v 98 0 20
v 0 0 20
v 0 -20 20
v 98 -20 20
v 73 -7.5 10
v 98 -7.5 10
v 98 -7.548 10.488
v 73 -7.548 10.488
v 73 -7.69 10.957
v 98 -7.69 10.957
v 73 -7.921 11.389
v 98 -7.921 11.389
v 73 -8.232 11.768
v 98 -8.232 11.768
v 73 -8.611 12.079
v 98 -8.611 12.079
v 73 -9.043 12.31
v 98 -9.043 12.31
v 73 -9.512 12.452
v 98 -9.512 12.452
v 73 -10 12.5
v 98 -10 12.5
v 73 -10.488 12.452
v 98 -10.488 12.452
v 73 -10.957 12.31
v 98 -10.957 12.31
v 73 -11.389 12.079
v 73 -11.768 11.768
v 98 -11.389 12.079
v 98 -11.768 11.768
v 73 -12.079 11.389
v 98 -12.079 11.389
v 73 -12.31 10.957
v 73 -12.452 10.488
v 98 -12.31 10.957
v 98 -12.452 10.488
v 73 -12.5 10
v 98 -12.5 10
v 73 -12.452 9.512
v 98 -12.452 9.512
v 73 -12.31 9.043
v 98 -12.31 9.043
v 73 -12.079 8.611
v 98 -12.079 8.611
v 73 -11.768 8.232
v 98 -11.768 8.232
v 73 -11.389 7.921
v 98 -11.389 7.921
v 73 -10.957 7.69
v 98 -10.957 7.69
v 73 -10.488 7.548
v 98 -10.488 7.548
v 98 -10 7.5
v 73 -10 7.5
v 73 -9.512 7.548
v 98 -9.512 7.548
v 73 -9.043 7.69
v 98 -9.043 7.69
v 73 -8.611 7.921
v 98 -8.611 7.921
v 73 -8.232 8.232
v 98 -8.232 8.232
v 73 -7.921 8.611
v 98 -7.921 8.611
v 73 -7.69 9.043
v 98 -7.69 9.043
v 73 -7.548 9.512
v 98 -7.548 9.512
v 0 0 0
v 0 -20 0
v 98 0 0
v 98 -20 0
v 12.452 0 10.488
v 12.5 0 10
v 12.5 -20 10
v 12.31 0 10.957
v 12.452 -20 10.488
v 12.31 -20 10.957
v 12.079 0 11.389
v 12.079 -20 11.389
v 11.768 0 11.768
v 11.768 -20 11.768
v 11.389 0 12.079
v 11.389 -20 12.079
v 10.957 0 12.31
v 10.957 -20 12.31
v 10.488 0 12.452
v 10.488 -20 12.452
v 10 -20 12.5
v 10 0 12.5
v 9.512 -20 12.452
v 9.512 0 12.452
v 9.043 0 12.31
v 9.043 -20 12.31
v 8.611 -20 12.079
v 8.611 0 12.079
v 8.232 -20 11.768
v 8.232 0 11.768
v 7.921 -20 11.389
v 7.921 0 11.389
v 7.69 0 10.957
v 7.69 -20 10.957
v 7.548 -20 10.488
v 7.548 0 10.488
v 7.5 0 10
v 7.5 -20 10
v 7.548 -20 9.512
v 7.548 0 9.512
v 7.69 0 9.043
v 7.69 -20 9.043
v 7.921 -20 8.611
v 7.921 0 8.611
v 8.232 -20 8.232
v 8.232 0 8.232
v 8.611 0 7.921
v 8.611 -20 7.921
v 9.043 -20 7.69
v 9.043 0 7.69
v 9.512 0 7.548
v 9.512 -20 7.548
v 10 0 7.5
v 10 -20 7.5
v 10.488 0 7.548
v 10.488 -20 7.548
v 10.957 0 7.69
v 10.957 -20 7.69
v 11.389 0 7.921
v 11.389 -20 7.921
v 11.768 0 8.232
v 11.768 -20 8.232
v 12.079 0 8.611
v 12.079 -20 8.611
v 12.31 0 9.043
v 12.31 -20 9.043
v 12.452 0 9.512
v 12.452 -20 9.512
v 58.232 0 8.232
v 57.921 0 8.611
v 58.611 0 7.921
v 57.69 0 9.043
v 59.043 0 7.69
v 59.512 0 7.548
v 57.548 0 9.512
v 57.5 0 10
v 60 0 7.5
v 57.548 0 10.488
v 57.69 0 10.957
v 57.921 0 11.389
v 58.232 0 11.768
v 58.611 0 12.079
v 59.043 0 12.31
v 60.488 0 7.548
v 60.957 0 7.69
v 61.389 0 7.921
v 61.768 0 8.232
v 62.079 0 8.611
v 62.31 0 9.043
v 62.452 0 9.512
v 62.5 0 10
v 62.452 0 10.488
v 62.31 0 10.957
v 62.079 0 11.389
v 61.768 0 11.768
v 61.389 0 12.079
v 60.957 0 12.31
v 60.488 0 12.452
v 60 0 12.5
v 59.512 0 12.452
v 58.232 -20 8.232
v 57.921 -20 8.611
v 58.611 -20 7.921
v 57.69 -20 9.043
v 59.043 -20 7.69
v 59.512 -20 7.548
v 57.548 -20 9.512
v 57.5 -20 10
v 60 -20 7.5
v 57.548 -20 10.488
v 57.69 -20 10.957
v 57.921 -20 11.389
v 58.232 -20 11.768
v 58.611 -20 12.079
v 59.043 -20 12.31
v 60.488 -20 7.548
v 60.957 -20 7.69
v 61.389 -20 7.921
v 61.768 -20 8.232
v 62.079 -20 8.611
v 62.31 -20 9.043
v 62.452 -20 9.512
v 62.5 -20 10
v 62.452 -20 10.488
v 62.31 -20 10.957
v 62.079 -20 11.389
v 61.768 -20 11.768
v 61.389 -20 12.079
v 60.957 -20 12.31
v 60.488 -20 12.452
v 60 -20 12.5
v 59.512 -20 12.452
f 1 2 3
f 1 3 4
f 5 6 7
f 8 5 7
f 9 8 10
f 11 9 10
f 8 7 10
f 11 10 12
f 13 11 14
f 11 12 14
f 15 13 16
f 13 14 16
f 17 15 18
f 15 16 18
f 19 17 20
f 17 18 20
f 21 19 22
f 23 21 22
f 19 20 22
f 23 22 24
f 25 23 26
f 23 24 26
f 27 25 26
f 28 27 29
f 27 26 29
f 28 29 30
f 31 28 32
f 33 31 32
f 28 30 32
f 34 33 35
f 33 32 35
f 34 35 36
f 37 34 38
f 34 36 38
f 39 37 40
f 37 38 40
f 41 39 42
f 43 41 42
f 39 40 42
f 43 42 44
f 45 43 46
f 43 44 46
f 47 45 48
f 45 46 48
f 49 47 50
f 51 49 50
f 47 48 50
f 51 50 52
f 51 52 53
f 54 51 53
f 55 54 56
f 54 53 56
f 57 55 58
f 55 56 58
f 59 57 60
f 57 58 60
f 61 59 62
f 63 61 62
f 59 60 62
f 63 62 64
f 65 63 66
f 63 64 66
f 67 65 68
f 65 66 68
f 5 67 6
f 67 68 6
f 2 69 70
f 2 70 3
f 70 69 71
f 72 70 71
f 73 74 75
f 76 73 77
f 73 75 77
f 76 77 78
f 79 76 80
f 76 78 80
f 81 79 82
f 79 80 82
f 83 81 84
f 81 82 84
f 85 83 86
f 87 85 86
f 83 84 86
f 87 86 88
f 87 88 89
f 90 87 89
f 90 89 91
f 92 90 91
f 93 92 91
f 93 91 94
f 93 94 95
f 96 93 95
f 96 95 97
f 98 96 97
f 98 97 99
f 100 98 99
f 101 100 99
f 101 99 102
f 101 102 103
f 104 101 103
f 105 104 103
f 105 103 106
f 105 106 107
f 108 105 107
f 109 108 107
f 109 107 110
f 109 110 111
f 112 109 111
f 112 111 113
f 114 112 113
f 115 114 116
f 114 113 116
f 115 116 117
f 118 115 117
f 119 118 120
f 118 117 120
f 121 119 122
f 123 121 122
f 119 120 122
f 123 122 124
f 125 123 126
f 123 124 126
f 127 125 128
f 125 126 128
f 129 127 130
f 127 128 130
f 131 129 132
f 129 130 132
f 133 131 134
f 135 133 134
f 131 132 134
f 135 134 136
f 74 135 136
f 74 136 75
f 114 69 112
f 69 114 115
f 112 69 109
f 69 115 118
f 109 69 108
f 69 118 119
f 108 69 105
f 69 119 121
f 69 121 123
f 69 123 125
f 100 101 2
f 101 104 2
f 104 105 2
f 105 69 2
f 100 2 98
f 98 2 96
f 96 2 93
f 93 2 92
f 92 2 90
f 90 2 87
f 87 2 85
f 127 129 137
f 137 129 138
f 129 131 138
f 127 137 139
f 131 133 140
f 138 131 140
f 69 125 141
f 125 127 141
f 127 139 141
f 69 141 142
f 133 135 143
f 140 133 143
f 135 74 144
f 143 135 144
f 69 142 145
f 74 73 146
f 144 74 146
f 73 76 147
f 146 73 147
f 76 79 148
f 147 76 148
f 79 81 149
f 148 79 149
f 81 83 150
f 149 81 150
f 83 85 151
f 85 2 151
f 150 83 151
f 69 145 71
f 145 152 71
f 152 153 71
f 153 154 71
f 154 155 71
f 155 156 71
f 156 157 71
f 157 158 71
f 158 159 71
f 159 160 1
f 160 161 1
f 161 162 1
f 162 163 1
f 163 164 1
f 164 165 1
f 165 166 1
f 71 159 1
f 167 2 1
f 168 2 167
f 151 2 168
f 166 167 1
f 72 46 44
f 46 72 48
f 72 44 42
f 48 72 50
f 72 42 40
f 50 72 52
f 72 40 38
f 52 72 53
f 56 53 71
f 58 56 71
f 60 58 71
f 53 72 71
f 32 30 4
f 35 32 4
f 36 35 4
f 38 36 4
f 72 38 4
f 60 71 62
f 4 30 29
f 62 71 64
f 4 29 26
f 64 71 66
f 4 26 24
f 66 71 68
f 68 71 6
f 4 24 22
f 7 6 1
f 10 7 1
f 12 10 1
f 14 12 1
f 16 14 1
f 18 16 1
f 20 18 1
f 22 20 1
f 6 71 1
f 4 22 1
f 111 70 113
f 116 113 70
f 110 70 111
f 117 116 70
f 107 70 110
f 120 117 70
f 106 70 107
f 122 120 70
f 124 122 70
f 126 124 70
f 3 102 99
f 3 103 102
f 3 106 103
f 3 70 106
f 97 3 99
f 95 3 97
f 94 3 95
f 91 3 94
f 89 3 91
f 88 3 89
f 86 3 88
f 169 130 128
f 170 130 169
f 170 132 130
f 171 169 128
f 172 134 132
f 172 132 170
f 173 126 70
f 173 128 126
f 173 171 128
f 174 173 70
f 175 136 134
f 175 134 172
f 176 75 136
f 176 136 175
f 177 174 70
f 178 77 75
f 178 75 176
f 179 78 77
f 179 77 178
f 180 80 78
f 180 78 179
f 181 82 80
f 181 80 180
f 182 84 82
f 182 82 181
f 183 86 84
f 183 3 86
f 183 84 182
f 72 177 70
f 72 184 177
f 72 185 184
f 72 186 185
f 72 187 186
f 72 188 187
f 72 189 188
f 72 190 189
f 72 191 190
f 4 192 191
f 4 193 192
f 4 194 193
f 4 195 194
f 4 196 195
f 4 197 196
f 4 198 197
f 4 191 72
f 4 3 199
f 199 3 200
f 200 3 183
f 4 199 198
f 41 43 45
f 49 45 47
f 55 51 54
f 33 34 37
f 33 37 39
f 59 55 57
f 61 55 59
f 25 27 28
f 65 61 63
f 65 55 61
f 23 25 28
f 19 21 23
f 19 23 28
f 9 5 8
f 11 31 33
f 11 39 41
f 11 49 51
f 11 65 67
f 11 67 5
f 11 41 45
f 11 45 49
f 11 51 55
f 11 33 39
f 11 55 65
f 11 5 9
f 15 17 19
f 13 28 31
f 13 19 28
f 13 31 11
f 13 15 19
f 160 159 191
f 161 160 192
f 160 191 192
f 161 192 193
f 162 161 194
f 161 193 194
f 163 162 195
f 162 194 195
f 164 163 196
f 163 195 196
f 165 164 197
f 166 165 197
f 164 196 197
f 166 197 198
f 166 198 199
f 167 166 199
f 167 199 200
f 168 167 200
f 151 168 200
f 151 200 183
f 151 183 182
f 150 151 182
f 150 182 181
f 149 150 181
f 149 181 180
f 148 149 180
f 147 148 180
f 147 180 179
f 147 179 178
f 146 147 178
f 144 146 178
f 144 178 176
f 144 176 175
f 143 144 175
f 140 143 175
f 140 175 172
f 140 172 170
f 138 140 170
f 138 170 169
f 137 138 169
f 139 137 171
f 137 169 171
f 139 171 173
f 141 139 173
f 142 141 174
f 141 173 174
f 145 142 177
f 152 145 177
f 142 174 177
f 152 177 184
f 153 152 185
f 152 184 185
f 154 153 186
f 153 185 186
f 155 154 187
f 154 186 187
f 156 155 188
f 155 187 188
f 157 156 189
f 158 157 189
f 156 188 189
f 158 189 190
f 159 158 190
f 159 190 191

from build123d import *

# Parameters (mm, degrees)
F0_W     = 98
F0_H     = 20
F1_DEPTH = 20
F2_R     = 2.5
F3_DEPTH = 25
F4_R     = 2.5
F5_DEPTH = 20.001


with BuildPart() as f1:
    # F0 (on Front) → F1 (new body)
    with BuildSketch(Plane.XZ):
        with Locations((49, 10)):
            Rectangle(F0_W, F0_H)
    extrude(amount=F1_DEPTH)

    # F2 (on face) → F3 (cut)
    with BuildSketch(Plane.YZ.offset(98)):
        with Locations((-10, 10)):
            Circle(F2_R)
    extrude(amount=-F3_DEPTH, mode=Mode.SUBTRACT)

    # F4 (on face) → F5 (cut, through all)
    with BuildSketch(Plane.XZ.offset(20)):
        with Locations((10, 10)):
            Circle(F4_R)
        with Locations((60, 10)):
            Circle(F4_R)
    extrude(amount=-F5_DEPTH, mode=Mode.SUBTRACT)


solid = f1.part
